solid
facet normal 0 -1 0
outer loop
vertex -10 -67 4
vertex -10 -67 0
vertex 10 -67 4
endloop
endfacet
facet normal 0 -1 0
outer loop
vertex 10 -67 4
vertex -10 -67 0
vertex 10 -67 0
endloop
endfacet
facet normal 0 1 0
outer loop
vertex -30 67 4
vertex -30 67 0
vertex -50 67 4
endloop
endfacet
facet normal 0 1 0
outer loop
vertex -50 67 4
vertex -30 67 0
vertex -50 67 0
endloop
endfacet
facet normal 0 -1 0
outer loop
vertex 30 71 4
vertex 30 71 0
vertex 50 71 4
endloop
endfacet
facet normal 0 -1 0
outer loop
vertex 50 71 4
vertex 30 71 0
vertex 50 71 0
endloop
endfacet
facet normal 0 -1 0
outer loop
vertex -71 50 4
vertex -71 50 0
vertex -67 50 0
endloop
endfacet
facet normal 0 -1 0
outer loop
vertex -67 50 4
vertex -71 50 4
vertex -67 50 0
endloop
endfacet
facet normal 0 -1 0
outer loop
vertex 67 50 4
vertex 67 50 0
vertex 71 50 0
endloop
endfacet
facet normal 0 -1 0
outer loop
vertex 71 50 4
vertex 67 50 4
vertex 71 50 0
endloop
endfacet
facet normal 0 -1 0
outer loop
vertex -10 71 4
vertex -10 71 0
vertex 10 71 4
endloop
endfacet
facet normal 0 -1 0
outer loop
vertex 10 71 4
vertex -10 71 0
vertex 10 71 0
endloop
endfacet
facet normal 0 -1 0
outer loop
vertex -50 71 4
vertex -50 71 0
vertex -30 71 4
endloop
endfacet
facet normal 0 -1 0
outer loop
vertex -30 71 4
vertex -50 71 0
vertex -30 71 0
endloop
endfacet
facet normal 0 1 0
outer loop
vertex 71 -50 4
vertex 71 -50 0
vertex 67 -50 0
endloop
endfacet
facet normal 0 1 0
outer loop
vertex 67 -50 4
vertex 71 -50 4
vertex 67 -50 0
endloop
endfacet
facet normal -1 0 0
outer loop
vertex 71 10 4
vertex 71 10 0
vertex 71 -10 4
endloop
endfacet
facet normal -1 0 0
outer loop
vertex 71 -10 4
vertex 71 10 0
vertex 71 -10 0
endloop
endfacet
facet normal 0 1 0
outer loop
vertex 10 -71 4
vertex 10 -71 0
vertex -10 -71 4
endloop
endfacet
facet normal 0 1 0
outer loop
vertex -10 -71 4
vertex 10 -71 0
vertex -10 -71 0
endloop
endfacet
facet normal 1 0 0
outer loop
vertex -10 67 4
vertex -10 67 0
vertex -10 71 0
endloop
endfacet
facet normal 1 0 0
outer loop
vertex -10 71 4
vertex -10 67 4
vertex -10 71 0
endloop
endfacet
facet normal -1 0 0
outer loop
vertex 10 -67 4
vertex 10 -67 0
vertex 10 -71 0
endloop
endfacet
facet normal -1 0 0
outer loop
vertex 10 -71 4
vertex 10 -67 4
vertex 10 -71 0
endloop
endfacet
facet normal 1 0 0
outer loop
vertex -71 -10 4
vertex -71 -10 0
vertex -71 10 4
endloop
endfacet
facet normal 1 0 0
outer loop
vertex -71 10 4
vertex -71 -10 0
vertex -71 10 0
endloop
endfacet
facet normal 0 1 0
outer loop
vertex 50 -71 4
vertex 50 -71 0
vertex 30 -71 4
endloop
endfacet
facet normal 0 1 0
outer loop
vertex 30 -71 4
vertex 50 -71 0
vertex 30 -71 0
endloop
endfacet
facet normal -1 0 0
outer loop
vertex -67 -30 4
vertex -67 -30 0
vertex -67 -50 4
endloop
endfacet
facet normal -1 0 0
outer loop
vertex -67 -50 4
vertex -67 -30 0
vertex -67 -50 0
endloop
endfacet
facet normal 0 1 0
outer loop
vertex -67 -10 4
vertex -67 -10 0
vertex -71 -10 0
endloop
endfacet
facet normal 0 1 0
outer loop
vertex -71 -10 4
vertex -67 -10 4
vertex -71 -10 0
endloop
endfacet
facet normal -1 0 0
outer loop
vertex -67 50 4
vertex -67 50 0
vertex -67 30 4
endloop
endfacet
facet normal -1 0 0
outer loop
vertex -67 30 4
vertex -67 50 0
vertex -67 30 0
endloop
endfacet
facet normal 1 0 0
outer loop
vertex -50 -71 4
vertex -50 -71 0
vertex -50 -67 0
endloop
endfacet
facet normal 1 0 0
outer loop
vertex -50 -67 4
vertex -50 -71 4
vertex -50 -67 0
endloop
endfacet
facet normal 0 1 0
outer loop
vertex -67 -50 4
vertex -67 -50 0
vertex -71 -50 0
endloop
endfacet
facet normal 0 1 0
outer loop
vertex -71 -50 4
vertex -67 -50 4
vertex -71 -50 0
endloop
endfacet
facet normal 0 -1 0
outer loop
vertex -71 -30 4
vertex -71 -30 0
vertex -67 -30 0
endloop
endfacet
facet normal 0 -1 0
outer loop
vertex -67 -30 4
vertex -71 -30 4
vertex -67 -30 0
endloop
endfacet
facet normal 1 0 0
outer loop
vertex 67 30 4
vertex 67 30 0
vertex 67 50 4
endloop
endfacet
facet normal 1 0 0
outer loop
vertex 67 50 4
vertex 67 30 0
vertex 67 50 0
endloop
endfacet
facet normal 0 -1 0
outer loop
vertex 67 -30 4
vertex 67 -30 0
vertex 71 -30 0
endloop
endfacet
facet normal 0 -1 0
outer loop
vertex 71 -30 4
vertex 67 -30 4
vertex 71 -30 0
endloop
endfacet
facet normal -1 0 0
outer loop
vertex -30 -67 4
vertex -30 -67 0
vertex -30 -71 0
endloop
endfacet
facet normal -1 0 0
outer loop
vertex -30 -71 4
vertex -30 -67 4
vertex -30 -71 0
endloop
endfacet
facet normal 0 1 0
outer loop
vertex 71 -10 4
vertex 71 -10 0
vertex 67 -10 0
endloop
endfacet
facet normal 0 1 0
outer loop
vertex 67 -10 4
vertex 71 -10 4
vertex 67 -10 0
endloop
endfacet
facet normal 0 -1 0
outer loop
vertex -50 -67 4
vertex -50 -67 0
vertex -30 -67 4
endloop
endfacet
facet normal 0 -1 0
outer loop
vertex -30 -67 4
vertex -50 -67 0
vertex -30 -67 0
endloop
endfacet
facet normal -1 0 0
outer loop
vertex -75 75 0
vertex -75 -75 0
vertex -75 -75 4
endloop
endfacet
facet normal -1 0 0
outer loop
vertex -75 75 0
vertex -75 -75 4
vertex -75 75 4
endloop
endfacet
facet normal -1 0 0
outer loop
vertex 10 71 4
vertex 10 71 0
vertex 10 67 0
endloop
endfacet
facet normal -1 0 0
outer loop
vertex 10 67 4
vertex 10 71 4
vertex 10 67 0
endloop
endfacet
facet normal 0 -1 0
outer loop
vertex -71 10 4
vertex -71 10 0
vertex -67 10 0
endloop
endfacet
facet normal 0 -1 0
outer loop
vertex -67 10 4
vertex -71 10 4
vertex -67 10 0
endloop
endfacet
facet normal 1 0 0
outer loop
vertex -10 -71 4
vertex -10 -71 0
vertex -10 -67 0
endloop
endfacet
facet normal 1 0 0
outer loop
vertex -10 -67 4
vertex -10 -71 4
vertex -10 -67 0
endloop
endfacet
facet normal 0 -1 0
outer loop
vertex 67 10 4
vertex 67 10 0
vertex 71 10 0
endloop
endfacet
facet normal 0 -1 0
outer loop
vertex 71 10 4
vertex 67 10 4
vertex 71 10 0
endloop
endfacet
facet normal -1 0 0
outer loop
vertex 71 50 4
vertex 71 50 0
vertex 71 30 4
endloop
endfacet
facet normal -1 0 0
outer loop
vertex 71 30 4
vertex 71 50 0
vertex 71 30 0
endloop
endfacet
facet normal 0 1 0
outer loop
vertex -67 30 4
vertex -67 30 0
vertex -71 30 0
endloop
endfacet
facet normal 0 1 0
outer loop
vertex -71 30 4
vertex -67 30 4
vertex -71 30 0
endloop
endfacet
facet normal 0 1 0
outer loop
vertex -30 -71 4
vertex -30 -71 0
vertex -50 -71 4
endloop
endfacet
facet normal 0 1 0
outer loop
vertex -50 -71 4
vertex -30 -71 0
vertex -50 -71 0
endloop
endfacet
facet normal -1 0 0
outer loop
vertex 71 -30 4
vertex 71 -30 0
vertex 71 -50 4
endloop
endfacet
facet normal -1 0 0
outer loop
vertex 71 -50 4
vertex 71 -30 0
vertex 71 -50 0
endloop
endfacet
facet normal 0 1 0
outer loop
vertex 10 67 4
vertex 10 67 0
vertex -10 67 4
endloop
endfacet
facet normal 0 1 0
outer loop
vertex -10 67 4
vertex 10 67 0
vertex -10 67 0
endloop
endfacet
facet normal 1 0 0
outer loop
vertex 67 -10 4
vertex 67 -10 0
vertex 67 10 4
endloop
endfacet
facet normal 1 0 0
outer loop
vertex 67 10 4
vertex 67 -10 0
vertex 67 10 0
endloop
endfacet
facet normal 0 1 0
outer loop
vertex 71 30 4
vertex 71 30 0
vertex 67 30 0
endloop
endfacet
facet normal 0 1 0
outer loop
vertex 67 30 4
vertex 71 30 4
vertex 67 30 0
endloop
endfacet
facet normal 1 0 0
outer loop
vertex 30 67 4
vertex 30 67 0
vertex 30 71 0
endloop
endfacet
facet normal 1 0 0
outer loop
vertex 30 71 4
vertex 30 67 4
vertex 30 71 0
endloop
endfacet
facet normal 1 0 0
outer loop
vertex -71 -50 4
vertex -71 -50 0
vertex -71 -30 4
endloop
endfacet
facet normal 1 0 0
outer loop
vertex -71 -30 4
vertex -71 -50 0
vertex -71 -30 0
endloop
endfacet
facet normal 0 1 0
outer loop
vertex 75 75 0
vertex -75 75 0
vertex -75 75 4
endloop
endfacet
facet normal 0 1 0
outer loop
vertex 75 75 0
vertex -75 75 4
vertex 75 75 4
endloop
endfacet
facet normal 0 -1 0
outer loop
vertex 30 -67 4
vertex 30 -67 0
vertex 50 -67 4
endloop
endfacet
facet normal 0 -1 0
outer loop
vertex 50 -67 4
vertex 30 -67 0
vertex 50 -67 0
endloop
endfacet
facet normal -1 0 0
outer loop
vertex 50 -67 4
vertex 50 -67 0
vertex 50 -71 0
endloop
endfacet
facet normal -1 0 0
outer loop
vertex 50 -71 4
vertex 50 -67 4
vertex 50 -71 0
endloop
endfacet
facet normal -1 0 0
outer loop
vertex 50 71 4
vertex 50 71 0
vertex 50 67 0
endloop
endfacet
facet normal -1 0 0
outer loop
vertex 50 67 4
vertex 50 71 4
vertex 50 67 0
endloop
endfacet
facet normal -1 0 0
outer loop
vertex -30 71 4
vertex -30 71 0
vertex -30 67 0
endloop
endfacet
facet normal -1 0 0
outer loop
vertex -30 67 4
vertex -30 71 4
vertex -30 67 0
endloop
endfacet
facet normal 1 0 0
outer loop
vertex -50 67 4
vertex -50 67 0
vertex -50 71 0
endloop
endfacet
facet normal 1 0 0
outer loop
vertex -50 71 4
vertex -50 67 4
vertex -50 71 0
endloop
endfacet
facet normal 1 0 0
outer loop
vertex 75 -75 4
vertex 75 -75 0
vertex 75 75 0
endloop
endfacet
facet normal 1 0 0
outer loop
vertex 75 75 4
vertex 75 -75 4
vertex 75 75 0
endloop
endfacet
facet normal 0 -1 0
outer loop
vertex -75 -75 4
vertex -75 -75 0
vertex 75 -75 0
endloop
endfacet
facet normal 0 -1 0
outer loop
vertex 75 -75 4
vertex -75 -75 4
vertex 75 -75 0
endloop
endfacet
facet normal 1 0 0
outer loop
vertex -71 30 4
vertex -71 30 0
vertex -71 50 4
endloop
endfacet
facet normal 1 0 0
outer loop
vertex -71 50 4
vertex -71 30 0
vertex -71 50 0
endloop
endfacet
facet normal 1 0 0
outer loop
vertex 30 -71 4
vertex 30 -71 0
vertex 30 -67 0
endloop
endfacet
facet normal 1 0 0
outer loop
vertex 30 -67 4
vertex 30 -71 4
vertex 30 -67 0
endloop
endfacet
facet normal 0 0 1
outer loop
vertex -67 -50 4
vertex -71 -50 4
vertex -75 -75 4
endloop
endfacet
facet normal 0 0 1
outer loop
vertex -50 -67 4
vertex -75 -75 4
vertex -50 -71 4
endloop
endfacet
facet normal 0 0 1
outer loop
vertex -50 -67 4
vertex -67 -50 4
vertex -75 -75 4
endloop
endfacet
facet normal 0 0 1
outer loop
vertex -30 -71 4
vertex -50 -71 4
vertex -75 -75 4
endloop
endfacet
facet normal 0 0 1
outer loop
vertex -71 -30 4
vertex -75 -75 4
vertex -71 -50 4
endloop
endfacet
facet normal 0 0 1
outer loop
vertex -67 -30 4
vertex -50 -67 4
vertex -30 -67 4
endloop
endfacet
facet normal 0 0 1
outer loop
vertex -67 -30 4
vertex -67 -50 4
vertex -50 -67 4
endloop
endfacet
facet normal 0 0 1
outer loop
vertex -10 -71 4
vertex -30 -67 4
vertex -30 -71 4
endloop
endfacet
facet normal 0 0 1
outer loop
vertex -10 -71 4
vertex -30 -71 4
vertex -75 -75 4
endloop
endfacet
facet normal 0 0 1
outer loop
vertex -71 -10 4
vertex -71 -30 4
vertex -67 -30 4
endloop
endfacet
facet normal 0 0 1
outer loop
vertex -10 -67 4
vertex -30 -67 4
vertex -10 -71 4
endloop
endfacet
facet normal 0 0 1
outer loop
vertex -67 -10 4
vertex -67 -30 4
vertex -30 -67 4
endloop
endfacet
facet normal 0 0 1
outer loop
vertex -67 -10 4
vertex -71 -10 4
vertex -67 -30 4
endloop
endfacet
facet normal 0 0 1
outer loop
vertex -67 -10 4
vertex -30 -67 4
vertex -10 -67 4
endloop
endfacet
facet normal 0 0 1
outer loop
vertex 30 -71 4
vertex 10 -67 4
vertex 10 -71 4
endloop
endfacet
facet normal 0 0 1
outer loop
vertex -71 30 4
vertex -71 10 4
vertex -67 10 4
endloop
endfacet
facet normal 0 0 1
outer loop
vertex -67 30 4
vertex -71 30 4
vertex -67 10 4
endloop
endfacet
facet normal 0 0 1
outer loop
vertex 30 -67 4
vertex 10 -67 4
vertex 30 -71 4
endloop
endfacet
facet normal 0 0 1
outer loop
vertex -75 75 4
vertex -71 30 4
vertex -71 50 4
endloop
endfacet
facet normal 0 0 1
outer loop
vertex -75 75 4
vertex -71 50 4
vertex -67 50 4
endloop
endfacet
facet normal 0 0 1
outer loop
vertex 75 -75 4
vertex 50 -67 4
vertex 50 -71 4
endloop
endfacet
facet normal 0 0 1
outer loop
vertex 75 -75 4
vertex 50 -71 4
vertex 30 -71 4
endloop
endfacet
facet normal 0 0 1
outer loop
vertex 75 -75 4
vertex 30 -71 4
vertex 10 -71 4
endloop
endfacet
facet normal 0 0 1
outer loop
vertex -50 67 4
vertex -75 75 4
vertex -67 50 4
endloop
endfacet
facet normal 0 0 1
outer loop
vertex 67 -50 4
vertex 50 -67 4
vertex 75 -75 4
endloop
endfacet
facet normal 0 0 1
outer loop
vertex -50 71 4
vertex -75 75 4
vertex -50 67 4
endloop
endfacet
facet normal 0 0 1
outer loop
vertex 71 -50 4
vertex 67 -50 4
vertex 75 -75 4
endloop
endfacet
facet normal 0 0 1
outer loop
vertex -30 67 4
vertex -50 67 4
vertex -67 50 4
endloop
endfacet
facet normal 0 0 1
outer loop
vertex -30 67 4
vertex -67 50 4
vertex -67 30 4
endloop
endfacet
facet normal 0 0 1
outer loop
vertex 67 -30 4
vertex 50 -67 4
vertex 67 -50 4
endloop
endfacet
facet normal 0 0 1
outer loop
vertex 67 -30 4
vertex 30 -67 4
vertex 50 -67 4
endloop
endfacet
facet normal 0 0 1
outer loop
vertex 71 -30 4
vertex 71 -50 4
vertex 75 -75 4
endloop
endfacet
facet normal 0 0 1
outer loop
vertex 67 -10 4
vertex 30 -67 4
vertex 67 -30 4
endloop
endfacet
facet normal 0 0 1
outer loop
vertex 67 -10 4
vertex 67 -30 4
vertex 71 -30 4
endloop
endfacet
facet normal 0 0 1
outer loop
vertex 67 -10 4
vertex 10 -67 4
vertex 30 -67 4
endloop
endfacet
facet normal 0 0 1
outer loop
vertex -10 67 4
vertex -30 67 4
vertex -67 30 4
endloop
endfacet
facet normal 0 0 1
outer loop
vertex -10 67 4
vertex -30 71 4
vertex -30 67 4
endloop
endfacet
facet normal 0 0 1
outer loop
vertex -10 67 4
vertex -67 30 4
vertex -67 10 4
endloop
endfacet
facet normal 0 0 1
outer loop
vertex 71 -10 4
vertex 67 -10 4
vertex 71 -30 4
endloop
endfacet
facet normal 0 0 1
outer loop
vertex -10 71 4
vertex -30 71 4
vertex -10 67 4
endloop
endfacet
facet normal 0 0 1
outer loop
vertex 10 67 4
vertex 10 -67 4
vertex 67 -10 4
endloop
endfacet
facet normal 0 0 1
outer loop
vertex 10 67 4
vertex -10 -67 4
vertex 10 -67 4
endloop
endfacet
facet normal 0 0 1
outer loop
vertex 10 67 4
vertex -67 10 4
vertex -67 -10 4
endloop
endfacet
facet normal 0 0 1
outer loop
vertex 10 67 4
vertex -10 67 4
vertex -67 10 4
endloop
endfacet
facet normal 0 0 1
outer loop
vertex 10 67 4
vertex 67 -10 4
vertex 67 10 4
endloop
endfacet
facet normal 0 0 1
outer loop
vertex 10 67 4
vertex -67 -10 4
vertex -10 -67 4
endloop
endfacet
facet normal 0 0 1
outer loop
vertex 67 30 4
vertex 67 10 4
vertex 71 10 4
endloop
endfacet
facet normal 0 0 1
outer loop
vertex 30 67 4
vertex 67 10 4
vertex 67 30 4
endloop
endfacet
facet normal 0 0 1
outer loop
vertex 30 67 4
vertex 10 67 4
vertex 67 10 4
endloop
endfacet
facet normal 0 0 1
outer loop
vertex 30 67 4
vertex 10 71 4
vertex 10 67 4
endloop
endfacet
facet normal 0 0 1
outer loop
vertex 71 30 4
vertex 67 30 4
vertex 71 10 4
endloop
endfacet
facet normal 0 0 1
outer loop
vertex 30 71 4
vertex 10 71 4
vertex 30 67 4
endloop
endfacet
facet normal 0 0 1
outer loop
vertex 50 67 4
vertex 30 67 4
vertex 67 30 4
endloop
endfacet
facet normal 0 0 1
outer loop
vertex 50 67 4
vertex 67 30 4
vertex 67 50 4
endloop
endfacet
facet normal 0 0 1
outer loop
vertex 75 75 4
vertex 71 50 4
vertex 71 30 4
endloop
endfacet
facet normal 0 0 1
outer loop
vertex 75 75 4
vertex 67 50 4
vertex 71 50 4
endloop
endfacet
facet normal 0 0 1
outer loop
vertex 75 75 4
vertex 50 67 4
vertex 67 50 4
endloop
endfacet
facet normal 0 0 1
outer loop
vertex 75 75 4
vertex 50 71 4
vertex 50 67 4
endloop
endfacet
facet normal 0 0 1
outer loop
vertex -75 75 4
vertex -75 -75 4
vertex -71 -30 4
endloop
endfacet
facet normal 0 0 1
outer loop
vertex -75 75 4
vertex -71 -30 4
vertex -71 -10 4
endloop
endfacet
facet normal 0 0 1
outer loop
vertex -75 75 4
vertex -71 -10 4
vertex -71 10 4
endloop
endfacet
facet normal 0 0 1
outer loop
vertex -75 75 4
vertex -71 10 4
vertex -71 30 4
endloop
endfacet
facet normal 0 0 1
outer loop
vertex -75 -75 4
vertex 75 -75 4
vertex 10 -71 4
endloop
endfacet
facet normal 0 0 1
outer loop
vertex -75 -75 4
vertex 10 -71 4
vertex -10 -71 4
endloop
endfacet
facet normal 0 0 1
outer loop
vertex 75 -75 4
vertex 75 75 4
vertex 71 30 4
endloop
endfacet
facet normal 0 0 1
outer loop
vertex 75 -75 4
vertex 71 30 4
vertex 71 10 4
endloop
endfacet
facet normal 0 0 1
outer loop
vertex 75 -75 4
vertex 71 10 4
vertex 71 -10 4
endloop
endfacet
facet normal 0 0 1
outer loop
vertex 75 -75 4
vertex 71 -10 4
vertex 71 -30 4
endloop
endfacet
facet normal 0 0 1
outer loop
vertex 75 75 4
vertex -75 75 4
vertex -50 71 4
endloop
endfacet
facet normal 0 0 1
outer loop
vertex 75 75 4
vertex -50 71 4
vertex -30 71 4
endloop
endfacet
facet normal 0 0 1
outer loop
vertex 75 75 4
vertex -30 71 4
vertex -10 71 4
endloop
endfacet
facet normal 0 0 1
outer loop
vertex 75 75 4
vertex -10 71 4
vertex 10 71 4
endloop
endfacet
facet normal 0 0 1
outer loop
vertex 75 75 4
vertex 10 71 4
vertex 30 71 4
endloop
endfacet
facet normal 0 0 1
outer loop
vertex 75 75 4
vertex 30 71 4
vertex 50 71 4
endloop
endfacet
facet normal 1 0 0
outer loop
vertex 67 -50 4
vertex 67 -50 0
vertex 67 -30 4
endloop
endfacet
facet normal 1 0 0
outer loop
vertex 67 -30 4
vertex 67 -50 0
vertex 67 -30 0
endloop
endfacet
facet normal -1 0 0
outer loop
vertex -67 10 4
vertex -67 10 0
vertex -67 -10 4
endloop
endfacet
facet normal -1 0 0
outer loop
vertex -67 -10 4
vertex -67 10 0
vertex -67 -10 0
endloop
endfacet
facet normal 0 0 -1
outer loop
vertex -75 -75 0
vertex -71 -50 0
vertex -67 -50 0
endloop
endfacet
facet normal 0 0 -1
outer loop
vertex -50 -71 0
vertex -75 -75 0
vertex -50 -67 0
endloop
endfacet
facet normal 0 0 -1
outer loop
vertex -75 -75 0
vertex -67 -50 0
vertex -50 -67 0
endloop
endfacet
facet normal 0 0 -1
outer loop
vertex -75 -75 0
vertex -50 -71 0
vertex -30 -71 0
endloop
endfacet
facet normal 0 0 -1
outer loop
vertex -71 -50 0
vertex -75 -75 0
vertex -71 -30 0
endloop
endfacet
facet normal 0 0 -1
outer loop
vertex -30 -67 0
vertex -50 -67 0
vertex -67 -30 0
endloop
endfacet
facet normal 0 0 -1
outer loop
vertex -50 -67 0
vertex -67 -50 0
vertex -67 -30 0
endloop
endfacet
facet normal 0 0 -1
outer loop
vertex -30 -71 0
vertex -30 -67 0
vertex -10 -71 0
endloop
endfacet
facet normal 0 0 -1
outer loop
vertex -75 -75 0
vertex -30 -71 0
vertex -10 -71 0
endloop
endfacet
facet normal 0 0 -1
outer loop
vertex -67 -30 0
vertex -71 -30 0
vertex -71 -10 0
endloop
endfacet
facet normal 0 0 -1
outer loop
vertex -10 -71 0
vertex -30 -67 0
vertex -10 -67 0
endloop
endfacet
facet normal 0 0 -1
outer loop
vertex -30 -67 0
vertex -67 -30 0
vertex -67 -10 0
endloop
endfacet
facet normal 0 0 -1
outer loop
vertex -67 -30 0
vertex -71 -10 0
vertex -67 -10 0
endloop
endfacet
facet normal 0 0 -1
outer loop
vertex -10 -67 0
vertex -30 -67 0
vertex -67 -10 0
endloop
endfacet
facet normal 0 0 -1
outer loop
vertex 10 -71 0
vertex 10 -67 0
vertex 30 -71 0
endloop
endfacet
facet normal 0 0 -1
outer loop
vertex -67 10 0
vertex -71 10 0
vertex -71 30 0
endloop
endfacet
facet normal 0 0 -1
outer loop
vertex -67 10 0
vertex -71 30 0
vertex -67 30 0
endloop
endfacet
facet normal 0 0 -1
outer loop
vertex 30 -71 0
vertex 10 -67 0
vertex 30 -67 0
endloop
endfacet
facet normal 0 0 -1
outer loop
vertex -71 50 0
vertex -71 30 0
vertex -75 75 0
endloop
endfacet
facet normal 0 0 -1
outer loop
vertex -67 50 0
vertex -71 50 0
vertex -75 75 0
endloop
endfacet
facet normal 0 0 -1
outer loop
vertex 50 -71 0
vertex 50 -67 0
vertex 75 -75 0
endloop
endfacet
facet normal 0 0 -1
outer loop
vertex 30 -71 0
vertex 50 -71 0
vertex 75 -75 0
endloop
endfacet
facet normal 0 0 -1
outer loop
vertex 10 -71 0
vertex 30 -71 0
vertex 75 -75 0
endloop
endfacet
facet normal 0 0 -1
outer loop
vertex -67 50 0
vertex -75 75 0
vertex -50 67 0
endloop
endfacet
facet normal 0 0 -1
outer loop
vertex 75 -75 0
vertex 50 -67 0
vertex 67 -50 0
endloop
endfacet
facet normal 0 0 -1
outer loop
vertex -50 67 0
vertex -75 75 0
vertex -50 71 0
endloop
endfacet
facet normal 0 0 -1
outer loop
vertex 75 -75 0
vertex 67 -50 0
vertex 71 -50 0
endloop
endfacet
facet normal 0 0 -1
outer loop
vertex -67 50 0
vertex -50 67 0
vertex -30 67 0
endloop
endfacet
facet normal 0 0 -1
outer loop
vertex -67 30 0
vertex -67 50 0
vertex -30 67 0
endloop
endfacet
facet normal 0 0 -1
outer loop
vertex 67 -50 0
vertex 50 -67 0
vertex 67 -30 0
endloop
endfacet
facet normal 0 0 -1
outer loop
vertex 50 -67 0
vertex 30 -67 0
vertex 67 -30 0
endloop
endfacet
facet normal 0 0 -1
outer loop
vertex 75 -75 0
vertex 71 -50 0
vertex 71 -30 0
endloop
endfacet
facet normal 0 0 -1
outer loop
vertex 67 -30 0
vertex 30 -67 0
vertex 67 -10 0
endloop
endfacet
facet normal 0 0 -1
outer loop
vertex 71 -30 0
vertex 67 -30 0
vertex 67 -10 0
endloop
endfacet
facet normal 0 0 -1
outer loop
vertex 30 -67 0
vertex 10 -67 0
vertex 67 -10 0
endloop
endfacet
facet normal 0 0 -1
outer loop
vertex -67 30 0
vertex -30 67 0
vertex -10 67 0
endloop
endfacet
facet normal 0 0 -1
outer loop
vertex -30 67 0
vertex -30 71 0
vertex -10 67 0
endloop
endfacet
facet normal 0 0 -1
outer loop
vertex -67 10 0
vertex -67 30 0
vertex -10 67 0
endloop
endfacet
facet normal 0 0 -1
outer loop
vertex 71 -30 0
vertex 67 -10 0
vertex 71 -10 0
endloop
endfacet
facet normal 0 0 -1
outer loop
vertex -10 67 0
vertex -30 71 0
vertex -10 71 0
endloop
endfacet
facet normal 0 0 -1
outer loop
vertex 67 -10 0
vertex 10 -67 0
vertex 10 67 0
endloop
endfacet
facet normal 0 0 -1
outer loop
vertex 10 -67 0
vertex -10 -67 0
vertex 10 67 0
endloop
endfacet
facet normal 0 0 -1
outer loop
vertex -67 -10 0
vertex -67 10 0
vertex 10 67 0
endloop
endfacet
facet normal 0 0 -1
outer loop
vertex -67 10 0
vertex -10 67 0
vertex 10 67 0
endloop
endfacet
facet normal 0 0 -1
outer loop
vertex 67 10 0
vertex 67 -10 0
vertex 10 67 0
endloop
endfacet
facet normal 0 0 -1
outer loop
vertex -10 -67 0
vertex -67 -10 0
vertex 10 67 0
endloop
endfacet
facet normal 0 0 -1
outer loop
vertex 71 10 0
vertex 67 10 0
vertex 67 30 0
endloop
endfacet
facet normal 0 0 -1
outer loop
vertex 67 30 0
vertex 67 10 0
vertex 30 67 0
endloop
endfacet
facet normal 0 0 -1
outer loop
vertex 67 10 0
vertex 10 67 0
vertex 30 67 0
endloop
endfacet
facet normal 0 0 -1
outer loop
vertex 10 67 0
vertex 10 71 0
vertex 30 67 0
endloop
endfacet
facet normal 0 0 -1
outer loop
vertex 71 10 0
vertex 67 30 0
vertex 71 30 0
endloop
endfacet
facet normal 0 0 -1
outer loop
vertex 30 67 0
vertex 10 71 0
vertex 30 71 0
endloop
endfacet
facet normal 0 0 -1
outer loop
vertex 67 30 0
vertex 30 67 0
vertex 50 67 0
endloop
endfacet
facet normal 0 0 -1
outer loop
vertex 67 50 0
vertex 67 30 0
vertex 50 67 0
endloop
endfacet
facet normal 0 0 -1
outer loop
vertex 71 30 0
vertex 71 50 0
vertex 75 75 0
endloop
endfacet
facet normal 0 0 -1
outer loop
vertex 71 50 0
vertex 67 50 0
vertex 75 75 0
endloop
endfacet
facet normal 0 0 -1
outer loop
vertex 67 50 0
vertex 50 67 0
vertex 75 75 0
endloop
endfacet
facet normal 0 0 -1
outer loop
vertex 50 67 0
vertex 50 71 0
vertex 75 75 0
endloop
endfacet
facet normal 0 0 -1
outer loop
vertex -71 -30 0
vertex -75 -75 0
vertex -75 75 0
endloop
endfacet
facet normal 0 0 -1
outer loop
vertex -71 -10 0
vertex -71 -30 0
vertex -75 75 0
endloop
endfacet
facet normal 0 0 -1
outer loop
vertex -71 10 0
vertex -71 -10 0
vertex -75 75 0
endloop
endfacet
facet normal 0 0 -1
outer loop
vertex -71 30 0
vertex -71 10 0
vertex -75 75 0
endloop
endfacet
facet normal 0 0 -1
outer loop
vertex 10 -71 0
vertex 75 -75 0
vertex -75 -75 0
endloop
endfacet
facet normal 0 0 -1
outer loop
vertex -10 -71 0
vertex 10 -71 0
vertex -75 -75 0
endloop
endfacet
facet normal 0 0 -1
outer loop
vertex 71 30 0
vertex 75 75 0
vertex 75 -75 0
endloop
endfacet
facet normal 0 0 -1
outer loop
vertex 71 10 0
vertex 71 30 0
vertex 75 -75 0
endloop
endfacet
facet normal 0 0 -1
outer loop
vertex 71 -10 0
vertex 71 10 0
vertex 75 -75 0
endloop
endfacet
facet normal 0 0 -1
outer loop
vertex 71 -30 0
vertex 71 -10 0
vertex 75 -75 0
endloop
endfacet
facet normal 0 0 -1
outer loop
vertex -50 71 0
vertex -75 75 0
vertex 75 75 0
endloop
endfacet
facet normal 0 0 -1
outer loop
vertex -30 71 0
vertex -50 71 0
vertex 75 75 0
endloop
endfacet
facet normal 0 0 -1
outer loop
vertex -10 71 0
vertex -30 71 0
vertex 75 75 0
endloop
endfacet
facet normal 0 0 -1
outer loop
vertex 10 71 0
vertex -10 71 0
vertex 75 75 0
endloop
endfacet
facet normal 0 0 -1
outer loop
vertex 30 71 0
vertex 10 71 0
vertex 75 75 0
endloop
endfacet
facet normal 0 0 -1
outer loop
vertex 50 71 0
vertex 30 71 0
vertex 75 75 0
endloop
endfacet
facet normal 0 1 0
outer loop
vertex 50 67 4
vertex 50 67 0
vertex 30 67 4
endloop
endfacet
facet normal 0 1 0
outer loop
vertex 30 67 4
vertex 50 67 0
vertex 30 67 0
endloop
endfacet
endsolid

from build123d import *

# Parameters (mm, degrees)
F0_W     = 150
F0_H     = 150
F1_DEPTH = 4


with BuildPart() as f1:
    # F0 (on Top) → F1 (new body)
    with BuildSketch(Plane.XY):
        Rectangle(F0_W, F0_H)
        Polygon((-30, -71), (-40, -71), (-50, -71), (-50, -67), (-40, -67), (-30, -67), align=None, mode=Mode.SUBTRACT)
        Polygon((-71, -30), (-67, -30), (-67, -50), (-71, -50), (-71, -40), align=None, mode=Mode.SUBTRACT)
        Polygon((-10, -71), (-10, -67), (0, -67), (10, -67), (10, -71), (0, -71), align=None, mode=Mode.SUBTRACT)
        Polygon((50, -71), (40, -71), (30, -71), (30, -67), (40, -67), (50, -67), align=None, mode=Mode.SUBTRACT)
        Polygon((71, -50), (67, -50), (67, -30), (71, -30), (71, -40), align=None, mode=Mode.SUBTRACT)
        Polygon((-71, -10), (-71, 0), (-71, 10), (-67, 10), (-67, 0), (-67, -10), align=None, mode=Mode.SUBTRACT)
        Polygon((-71, 50), (-67, 50), (-67, 30), (-71, 30), (-71, 40), align=None, mode=Mode.SUBTRACT)
        Polygon((-30, 71), (-30, 67), (-40, 67), (-50, 67), (-50, 71), (-40, 71), align=None, mode=Mode.SUBTRACT)
        Polygon((71, 0), (71, -10), (67, -10), (67, 10), (71, 10), align=None, mode=Mode.SUBTRACT)
        Polygon((-10, 71), (0, 71), (10, 71), (10, 67), (0, 67), (-10, 67), align=None, mode=Mode.SUBTRACT)
        Polygon((71, 30), (67, 30), (67, 50), (71, 50), (71, 40), align=None, mode=Mode.SUBTRACT)
        Polygon((30, 71), (40, 71), (50, 71), (50, 67), (40, 67), (30, 67), align=None, mode=Mode.SUBTRACT)
    extrude(amount=F1_DEPTH)


solid = f1.part
